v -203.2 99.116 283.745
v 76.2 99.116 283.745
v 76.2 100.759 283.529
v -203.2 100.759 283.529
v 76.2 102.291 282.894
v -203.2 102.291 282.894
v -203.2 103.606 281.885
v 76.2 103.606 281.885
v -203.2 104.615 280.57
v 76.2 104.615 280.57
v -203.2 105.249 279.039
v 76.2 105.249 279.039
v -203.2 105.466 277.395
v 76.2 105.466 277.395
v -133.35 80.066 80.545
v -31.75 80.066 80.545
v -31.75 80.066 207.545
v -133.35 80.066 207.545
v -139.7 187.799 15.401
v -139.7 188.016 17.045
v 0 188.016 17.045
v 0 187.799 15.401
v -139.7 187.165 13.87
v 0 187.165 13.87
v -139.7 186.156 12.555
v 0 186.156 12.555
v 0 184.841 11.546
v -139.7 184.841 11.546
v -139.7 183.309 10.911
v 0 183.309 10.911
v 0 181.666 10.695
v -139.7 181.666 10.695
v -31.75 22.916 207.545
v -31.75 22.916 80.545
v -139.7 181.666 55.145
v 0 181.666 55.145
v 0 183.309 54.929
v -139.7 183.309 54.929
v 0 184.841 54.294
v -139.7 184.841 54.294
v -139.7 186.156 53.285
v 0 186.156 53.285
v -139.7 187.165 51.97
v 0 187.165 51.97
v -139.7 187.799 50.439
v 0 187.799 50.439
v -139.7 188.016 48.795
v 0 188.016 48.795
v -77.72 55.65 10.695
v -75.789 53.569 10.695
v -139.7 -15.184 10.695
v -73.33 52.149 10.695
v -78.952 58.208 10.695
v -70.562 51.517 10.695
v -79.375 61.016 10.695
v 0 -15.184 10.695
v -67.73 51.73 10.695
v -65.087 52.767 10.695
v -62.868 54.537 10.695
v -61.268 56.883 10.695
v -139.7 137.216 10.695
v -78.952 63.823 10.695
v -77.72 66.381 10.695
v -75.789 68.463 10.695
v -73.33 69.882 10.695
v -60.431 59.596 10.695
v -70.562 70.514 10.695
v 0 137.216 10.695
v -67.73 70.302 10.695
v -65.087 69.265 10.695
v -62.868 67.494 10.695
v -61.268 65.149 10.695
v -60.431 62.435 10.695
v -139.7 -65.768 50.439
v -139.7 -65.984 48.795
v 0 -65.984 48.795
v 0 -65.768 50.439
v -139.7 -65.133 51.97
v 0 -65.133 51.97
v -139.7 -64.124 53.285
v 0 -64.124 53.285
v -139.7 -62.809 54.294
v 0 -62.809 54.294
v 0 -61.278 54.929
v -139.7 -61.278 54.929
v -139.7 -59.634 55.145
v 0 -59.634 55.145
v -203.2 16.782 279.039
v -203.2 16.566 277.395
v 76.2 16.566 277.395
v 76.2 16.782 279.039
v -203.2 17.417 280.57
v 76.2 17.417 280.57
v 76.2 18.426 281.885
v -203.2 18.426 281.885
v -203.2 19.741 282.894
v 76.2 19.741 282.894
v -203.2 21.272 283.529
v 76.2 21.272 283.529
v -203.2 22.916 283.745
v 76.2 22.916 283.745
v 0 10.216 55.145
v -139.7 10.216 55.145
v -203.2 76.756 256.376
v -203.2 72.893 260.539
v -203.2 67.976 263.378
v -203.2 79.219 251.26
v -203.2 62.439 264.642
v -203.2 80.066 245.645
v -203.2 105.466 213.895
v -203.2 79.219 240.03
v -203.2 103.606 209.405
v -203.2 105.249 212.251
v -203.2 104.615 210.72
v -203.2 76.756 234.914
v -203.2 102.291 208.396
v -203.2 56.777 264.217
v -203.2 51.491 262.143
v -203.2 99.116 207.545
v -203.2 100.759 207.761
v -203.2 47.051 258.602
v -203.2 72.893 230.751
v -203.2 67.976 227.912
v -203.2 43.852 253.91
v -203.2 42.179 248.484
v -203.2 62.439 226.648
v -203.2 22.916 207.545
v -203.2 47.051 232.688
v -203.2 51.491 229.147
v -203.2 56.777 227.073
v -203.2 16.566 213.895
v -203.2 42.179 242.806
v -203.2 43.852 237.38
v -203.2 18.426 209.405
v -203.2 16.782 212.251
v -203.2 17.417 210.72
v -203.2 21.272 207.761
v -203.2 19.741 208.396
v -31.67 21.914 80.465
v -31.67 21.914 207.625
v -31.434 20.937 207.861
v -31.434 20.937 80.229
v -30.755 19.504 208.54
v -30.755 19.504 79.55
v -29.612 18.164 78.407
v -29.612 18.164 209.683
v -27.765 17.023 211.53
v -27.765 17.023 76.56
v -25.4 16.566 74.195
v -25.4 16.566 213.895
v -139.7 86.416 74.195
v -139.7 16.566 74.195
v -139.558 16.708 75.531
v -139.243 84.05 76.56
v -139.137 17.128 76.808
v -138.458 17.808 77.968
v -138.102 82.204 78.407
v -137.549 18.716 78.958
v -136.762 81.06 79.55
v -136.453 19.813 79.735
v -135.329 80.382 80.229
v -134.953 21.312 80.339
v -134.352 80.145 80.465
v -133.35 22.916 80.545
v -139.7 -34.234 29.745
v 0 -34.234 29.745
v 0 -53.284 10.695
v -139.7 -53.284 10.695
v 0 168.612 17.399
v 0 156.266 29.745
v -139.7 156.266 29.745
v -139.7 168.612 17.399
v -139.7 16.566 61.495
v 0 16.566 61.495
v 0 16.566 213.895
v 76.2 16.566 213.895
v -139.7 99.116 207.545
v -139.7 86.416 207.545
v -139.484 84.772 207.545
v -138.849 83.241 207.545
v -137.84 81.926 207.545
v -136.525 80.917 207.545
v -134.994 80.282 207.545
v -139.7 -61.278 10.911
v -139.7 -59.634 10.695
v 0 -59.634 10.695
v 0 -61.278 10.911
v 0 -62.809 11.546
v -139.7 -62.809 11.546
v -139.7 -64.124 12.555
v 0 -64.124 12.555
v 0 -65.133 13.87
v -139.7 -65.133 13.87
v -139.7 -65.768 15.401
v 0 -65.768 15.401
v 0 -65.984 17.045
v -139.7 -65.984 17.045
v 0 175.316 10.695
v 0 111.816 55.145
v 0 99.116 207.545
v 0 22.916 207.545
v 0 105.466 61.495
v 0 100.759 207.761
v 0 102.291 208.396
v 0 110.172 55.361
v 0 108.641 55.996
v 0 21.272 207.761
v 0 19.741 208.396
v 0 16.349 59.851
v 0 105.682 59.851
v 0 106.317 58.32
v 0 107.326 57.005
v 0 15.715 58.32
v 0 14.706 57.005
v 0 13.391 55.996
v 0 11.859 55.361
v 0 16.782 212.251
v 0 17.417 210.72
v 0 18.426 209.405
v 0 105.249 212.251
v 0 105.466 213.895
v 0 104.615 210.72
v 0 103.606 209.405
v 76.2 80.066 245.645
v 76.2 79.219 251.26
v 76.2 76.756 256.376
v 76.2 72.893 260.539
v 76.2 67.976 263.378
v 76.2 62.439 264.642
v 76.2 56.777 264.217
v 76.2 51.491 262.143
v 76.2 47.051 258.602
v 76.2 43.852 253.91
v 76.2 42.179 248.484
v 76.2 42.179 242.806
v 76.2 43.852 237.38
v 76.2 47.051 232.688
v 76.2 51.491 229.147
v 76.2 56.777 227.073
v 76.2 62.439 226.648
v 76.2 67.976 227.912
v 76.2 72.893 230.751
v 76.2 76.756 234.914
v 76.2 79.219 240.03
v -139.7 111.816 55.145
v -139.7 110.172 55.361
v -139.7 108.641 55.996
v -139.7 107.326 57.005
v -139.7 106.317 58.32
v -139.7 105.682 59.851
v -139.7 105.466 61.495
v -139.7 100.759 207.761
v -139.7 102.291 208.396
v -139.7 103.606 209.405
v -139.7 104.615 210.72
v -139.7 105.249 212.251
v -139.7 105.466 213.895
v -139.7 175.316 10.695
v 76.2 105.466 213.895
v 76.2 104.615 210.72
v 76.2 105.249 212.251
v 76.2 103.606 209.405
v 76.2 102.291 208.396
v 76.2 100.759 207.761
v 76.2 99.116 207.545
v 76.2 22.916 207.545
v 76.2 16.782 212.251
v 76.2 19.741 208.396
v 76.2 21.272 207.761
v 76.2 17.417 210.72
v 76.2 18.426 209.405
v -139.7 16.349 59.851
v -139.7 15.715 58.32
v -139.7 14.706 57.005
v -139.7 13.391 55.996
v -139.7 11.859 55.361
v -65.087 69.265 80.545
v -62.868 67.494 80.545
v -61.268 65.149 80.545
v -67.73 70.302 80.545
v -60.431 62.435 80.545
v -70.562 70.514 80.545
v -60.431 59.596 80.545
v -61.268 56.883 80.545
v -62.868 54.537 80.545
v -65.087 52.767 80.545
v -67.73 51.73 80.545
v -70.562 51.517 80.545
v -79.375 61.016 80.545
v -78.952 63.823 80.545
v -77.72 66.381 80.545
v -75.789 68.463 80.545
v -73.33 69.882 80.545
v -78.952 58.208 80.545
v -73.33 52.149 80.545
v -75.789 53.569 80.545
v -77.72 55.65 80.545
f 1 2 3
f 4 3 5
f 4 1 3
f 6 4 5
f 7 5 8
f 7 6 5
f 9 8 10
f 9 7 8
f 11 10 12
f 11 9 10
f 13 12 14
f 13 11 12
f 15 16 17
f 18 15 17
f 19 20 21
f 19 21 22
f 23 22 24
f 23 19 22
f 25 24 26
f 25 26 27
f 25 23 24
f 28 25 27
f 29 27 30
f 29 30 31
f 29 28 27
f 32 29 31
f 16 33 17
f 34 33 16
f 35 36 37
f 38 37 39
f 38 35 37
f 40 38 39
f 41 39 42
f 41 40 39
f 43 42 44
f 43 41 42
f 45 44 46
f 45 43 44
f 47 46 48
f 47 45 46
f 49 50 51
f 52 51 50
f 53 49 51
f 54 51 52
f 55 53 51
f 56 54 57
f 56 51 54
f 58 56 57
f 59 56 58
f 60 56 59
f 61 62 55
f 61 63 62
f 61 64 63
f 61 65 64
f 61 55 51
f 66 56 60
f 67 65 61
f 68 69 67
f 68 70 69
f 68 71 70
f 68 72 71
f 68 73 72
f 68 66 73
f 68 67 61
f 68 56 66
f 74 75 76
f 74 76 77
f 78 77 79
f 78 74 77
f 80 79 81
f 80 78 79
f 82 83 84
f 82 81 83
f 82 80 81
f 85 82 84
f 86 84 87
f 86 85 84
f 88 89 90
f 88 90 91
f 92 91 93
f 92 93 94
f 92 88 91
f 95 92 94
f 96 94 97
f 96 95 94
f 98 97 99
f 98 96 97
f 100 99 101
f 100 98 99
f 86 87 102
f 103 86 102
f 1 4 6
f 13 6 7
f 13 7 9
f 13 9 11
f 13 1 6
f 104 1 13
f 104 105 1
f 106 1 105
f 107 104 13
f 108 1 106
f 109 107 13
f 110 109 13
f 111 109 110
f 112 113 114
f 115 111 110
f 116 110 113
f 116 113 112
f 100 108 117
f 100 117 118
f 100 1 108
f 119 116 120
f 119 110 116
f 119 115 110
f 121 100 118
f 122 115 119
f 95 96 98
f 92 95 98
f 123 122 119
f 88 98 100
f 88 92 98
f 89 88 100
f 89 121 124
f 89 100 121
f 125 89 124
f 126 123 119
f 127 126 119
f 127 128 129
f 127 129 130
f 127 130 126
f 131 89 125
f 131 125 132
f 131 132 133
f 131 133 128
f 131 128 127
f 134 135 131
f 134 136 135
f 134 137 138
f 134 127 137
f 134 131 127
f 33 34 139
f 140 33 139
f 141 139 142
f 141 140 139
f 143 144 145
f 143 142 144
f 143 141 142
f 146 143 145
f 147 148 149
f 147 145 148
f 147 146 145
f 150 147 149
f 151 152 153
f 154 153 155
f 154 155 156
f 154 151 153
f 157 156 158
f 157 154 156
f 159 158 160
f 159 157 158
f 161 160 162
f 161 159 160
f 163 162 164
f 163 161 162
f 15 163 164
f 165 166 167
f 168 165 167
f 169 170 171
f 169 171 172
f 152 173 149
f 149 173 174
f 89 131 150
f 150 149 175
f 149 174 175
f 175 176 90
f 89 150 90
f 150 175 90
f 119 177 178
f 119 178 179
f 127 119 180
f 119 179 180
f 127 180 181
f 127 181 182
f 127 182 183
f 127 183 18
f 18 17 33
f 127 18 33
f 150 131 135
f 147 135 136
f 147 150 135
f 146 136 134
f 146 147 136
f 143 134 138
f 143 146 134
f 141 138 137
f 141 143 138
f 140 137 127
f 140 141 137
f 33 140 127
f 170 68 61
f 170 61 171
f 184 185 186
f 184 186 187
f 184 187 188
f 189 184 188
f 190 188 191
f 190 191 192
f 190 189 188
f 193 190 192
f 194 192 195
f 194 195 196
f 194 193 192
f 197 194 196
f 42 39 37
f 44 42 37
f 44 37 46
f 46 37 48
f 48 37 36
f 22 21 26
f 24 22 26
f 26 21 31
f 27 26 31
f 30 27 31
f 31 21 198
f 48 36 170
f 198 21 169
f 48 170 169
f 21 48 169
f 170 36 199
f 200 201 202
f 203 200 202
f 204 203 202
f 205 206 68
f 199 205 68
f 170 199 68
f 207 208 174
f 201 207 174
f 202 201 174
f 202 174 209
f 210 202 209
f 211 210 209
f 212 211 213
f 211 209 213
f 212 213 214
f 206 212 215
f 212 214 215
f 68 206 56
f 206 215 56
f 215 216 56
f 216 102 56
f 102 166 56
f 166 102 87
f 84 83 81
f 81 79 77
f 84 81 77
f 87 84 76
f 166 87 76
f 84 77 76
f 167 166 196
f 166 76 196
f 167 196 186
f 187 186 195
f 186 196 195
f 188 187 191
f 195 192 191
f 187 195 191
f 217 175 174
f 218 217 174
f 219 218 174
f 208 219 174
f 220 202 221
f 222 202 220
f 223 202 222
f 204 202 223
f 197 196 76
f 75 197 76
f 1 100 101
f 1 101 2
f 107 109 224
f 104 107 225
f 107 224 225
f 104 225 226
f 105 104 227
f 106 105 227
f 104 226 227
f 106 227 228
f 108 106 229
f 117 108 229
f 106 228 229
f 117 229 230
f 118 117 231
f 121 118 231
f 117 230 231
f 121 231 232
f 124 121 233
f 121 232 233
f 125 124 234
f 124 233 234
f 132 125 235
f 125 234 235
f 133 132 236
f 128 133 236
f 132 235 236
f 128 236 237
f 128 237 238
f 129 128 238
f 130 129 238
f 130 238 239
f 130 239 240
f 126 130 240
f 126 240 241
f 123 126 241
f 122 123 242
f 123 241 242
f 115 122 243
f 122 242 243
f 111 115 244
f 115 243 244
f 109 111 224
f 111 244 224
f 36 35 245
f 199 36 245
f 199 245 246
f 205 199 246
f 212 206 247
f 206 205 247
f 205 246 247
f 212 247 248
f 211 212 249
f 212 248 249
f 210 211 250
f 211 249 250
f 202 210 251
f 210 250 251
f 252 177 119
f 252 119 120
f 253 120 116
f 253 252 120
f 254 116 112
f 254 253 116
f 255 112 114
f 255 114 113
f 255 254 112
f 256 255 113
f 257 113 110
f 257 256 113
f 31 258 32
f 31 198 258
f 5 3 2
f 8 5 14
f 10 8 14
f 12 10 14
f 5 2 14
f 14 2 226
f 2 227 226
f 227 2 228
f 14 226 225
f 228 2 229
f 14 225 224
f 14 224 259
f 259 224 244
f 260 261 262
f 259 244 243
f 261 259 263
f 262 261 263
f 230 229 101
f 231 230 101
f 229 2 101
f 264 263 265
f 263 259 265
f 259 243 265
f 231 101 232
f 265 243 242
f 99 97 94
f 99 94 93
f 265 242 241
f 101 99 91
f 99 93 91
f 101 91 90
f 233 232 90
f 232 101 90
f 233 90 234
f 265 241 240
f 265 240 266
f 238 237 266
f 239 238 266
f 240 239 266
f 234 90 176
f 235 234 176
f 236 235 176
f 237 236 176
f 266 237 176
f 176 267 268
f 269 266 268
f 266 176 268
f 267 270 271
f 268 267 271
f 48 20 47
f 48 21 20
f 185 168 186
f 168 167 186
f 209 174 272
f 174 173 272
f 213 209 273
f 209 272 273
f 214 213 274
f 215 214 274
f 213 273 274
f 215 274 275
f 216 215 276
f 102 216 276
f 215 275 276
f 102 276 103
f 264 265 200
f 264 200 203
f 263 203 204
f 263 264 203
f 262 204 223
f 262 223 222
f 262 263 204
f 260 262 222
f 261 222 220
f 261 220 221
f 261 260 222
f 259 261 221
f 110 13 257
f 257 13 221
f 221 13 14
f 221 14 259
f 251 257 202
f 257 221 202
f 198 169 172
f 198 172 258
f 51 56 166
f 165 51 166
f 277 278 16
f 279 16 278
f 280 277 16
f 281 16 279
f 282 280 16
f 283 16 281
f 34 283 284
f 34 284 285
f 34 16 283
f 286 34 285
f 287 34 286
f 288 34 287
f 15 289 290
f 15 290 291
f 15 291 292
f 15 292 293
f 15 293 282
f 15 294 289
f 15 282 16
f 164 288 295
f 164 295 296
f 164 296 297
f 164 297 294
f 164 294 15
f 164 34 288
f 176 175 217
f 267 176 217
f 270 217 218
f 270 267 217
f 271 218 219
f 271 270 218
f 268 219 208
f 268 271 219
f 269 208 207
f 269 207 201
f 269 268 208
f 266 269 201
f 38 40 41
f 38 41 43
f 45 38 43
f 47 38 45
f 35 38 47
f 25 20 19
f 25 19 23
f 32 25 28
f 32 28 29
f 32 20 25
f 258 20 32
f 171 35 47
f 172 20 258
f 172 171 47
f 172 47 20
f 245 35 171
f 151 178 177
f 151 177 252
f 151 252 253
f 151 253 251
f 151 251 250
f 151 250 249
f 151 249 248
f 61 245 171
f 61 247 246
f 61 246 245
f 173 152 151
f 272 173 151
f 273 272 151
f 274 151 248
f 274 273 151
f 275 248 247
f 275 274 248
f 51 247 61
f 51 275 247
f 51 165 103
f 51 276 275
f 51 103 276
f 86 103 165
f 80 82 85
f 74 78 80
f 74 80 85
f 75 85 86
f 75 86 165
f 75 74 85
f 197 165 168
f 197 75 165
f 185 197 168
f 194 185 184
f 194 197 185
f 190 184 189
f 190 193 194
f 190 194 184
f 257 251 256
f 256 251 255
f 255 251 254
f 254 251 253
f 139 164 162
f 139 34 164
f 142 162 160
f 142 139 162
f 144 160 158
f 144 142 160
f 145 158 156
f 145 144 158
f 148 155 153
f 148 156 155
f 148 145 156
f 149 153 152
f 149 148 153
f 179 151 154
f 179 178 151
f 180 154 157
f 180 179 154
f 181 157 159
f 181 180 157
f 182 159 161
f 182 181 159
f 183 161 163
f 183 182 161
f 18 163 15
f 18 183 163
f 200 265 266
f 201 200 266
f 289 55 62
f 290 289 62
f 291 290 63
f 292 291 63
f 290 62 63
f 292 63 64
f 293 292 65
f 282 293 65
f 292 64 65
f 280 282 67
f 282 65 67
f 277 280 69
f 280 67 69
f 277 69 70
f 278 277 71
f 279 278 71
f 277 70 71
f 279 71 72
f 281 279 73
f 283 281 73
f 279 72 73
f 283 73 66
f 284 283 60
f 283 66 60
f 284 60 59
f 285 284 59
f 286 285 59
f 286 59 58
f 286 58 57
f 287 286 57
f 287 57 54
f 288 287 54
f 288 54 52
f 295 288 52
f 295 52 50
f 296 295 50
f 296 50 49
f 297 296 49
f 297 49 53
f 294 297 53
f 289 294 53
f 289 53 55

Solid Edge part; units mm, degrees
sketch "Sketch1" plane through (0, 0, 0) normal (1, 0, 0) x (0, 1, 0)
  line L0 (-65.9842, 55.145) -> (61.0158, 55.145)
  line L1 (188.0158, 55.145) -> (61.0158, 55.145)
  line L2 (188.0158, 10.695) -> (188.0158, 55.145)
  line L3 (175.3158, 10.695) -> (188.0158, 10.695)
  line L4 (168.6119, 17.3988) -> (175.3158, 10.695)
  line L5 (156.2658, 29.745) -> (168.6119, 17.3988)
  line L6 (137.2158, 10.695) -> (156.2658, 29.745)
  line L7 (-15.1842, 10.695) -> (137.2158, 10.695)
  line L8 (-15.1842, 10.695) -> (-34.2342, 29.745)
  line L9 (-34.2342, 29.745) -> (-53.2842, 10.695)
  line L10 (-53.2842, 10.695) -> (-65.9842, 10.695)
  line L11 (-65.9842, 10.695) -> (-65.9842, 55.145)
extrude "Protrusion1" add sketch "Sketch1" against normal blind 139.7
sketch "Sketch2" plane through (0, 0, 0) normal (1, 0, 0) x (0, 1, 0)
  line L0 (16.5658, 207.545) -> (16.5658, 55.145)
  line L1 (16.5658, 55.145) -> (105.4658, 55.145)
  line L2 (105.4658, 55.145) -> (105.4658, 207.545)
  line L3 (105.4658, 207.545) -> (16.5658, 207.545)
extrude "ExtrudedProtrusion_2" add sketch "Sketch2" against normal blind 139.7
sketch "Sketch3" plane through (0, 0, 0) normal (1, 0, 0) x (0, 1, 0)
  line L0 (16.5658, 207.545) -> (16.5658, 283.745)
  line L1 (16.5658, 283.745) -> (105.4658, 283.745)
  line L2 (105.4658, 283.745) -> (105.4658, 207.545)
  line L3 (105.4658, 207.545) -> (16.5658, 207.545)
extrude "ExtrudedProtrusion_3" add sketch "Sketch3" against normal blind 203.2 and the other way blind 76.2
sketch "Sketch4" plane through (-63.5, 16.5658, 169.445) normal (0, -1, 0) x (1, 0, 0)
  line L0 (31.75, 38.1) -> (31.75, -88.9)
  line L1 (31.75, -88.9) -> (-76.2, -88.9)
  line L2 (-76.2, -88.9) -> (-76.2, 38.1)
  line L3 (-76.2, 38.1) -> (31.75, 38.1)
extrude "ExtrudedCutout_2" cut sketch "Sketch4" against normal blind 63.5 and the other way through all
sketch "Sketch5" plane through (76.2, 61.0158, 245.645) normal (1, 0, 0) x (0, 1, 0)
  circle A0 centre (0, 0) radius 19.05
extrude "Cutout1" cut sketch "Sketch5" against normal through all and the other way through all
fillet "Round_1" radius 6.35 16 edges at (-31.75, 16.5658, 144.045) (-85.725, 16.5658, 80.545) (-69.85, 16.5658, 55.145) (-117.475, 16.5658, 207.545) (38.1, 16.5658, 207.545) (-139.7, 80.0658, 144.045) (-139.7, 48.3158, 80.545) (-69.85, -65.9842, 55.145) (38.1, 105.4658, 207.545) (-63.5, 105.4658, 283.745) (-63.5, 16.5658, 283.745) (-171.45, 105.4658, 207.545) (-69.85, 105.4658, 55.145) (-69.85, 188.0158, 55.145) (-69.85, 188.0158, 10.695) (-69.85, -65.9842, 10.695)
sketch "Sketch6" plane through (-69.85, 61.0158, 10.695) normal (0, 0, -1) x (-1, 0, 0)
  circle A0 centre (0, 0) radius 9.525
extrude "Cutout2" cut sketch "Sketch6" against normal up to next and the other way through all
